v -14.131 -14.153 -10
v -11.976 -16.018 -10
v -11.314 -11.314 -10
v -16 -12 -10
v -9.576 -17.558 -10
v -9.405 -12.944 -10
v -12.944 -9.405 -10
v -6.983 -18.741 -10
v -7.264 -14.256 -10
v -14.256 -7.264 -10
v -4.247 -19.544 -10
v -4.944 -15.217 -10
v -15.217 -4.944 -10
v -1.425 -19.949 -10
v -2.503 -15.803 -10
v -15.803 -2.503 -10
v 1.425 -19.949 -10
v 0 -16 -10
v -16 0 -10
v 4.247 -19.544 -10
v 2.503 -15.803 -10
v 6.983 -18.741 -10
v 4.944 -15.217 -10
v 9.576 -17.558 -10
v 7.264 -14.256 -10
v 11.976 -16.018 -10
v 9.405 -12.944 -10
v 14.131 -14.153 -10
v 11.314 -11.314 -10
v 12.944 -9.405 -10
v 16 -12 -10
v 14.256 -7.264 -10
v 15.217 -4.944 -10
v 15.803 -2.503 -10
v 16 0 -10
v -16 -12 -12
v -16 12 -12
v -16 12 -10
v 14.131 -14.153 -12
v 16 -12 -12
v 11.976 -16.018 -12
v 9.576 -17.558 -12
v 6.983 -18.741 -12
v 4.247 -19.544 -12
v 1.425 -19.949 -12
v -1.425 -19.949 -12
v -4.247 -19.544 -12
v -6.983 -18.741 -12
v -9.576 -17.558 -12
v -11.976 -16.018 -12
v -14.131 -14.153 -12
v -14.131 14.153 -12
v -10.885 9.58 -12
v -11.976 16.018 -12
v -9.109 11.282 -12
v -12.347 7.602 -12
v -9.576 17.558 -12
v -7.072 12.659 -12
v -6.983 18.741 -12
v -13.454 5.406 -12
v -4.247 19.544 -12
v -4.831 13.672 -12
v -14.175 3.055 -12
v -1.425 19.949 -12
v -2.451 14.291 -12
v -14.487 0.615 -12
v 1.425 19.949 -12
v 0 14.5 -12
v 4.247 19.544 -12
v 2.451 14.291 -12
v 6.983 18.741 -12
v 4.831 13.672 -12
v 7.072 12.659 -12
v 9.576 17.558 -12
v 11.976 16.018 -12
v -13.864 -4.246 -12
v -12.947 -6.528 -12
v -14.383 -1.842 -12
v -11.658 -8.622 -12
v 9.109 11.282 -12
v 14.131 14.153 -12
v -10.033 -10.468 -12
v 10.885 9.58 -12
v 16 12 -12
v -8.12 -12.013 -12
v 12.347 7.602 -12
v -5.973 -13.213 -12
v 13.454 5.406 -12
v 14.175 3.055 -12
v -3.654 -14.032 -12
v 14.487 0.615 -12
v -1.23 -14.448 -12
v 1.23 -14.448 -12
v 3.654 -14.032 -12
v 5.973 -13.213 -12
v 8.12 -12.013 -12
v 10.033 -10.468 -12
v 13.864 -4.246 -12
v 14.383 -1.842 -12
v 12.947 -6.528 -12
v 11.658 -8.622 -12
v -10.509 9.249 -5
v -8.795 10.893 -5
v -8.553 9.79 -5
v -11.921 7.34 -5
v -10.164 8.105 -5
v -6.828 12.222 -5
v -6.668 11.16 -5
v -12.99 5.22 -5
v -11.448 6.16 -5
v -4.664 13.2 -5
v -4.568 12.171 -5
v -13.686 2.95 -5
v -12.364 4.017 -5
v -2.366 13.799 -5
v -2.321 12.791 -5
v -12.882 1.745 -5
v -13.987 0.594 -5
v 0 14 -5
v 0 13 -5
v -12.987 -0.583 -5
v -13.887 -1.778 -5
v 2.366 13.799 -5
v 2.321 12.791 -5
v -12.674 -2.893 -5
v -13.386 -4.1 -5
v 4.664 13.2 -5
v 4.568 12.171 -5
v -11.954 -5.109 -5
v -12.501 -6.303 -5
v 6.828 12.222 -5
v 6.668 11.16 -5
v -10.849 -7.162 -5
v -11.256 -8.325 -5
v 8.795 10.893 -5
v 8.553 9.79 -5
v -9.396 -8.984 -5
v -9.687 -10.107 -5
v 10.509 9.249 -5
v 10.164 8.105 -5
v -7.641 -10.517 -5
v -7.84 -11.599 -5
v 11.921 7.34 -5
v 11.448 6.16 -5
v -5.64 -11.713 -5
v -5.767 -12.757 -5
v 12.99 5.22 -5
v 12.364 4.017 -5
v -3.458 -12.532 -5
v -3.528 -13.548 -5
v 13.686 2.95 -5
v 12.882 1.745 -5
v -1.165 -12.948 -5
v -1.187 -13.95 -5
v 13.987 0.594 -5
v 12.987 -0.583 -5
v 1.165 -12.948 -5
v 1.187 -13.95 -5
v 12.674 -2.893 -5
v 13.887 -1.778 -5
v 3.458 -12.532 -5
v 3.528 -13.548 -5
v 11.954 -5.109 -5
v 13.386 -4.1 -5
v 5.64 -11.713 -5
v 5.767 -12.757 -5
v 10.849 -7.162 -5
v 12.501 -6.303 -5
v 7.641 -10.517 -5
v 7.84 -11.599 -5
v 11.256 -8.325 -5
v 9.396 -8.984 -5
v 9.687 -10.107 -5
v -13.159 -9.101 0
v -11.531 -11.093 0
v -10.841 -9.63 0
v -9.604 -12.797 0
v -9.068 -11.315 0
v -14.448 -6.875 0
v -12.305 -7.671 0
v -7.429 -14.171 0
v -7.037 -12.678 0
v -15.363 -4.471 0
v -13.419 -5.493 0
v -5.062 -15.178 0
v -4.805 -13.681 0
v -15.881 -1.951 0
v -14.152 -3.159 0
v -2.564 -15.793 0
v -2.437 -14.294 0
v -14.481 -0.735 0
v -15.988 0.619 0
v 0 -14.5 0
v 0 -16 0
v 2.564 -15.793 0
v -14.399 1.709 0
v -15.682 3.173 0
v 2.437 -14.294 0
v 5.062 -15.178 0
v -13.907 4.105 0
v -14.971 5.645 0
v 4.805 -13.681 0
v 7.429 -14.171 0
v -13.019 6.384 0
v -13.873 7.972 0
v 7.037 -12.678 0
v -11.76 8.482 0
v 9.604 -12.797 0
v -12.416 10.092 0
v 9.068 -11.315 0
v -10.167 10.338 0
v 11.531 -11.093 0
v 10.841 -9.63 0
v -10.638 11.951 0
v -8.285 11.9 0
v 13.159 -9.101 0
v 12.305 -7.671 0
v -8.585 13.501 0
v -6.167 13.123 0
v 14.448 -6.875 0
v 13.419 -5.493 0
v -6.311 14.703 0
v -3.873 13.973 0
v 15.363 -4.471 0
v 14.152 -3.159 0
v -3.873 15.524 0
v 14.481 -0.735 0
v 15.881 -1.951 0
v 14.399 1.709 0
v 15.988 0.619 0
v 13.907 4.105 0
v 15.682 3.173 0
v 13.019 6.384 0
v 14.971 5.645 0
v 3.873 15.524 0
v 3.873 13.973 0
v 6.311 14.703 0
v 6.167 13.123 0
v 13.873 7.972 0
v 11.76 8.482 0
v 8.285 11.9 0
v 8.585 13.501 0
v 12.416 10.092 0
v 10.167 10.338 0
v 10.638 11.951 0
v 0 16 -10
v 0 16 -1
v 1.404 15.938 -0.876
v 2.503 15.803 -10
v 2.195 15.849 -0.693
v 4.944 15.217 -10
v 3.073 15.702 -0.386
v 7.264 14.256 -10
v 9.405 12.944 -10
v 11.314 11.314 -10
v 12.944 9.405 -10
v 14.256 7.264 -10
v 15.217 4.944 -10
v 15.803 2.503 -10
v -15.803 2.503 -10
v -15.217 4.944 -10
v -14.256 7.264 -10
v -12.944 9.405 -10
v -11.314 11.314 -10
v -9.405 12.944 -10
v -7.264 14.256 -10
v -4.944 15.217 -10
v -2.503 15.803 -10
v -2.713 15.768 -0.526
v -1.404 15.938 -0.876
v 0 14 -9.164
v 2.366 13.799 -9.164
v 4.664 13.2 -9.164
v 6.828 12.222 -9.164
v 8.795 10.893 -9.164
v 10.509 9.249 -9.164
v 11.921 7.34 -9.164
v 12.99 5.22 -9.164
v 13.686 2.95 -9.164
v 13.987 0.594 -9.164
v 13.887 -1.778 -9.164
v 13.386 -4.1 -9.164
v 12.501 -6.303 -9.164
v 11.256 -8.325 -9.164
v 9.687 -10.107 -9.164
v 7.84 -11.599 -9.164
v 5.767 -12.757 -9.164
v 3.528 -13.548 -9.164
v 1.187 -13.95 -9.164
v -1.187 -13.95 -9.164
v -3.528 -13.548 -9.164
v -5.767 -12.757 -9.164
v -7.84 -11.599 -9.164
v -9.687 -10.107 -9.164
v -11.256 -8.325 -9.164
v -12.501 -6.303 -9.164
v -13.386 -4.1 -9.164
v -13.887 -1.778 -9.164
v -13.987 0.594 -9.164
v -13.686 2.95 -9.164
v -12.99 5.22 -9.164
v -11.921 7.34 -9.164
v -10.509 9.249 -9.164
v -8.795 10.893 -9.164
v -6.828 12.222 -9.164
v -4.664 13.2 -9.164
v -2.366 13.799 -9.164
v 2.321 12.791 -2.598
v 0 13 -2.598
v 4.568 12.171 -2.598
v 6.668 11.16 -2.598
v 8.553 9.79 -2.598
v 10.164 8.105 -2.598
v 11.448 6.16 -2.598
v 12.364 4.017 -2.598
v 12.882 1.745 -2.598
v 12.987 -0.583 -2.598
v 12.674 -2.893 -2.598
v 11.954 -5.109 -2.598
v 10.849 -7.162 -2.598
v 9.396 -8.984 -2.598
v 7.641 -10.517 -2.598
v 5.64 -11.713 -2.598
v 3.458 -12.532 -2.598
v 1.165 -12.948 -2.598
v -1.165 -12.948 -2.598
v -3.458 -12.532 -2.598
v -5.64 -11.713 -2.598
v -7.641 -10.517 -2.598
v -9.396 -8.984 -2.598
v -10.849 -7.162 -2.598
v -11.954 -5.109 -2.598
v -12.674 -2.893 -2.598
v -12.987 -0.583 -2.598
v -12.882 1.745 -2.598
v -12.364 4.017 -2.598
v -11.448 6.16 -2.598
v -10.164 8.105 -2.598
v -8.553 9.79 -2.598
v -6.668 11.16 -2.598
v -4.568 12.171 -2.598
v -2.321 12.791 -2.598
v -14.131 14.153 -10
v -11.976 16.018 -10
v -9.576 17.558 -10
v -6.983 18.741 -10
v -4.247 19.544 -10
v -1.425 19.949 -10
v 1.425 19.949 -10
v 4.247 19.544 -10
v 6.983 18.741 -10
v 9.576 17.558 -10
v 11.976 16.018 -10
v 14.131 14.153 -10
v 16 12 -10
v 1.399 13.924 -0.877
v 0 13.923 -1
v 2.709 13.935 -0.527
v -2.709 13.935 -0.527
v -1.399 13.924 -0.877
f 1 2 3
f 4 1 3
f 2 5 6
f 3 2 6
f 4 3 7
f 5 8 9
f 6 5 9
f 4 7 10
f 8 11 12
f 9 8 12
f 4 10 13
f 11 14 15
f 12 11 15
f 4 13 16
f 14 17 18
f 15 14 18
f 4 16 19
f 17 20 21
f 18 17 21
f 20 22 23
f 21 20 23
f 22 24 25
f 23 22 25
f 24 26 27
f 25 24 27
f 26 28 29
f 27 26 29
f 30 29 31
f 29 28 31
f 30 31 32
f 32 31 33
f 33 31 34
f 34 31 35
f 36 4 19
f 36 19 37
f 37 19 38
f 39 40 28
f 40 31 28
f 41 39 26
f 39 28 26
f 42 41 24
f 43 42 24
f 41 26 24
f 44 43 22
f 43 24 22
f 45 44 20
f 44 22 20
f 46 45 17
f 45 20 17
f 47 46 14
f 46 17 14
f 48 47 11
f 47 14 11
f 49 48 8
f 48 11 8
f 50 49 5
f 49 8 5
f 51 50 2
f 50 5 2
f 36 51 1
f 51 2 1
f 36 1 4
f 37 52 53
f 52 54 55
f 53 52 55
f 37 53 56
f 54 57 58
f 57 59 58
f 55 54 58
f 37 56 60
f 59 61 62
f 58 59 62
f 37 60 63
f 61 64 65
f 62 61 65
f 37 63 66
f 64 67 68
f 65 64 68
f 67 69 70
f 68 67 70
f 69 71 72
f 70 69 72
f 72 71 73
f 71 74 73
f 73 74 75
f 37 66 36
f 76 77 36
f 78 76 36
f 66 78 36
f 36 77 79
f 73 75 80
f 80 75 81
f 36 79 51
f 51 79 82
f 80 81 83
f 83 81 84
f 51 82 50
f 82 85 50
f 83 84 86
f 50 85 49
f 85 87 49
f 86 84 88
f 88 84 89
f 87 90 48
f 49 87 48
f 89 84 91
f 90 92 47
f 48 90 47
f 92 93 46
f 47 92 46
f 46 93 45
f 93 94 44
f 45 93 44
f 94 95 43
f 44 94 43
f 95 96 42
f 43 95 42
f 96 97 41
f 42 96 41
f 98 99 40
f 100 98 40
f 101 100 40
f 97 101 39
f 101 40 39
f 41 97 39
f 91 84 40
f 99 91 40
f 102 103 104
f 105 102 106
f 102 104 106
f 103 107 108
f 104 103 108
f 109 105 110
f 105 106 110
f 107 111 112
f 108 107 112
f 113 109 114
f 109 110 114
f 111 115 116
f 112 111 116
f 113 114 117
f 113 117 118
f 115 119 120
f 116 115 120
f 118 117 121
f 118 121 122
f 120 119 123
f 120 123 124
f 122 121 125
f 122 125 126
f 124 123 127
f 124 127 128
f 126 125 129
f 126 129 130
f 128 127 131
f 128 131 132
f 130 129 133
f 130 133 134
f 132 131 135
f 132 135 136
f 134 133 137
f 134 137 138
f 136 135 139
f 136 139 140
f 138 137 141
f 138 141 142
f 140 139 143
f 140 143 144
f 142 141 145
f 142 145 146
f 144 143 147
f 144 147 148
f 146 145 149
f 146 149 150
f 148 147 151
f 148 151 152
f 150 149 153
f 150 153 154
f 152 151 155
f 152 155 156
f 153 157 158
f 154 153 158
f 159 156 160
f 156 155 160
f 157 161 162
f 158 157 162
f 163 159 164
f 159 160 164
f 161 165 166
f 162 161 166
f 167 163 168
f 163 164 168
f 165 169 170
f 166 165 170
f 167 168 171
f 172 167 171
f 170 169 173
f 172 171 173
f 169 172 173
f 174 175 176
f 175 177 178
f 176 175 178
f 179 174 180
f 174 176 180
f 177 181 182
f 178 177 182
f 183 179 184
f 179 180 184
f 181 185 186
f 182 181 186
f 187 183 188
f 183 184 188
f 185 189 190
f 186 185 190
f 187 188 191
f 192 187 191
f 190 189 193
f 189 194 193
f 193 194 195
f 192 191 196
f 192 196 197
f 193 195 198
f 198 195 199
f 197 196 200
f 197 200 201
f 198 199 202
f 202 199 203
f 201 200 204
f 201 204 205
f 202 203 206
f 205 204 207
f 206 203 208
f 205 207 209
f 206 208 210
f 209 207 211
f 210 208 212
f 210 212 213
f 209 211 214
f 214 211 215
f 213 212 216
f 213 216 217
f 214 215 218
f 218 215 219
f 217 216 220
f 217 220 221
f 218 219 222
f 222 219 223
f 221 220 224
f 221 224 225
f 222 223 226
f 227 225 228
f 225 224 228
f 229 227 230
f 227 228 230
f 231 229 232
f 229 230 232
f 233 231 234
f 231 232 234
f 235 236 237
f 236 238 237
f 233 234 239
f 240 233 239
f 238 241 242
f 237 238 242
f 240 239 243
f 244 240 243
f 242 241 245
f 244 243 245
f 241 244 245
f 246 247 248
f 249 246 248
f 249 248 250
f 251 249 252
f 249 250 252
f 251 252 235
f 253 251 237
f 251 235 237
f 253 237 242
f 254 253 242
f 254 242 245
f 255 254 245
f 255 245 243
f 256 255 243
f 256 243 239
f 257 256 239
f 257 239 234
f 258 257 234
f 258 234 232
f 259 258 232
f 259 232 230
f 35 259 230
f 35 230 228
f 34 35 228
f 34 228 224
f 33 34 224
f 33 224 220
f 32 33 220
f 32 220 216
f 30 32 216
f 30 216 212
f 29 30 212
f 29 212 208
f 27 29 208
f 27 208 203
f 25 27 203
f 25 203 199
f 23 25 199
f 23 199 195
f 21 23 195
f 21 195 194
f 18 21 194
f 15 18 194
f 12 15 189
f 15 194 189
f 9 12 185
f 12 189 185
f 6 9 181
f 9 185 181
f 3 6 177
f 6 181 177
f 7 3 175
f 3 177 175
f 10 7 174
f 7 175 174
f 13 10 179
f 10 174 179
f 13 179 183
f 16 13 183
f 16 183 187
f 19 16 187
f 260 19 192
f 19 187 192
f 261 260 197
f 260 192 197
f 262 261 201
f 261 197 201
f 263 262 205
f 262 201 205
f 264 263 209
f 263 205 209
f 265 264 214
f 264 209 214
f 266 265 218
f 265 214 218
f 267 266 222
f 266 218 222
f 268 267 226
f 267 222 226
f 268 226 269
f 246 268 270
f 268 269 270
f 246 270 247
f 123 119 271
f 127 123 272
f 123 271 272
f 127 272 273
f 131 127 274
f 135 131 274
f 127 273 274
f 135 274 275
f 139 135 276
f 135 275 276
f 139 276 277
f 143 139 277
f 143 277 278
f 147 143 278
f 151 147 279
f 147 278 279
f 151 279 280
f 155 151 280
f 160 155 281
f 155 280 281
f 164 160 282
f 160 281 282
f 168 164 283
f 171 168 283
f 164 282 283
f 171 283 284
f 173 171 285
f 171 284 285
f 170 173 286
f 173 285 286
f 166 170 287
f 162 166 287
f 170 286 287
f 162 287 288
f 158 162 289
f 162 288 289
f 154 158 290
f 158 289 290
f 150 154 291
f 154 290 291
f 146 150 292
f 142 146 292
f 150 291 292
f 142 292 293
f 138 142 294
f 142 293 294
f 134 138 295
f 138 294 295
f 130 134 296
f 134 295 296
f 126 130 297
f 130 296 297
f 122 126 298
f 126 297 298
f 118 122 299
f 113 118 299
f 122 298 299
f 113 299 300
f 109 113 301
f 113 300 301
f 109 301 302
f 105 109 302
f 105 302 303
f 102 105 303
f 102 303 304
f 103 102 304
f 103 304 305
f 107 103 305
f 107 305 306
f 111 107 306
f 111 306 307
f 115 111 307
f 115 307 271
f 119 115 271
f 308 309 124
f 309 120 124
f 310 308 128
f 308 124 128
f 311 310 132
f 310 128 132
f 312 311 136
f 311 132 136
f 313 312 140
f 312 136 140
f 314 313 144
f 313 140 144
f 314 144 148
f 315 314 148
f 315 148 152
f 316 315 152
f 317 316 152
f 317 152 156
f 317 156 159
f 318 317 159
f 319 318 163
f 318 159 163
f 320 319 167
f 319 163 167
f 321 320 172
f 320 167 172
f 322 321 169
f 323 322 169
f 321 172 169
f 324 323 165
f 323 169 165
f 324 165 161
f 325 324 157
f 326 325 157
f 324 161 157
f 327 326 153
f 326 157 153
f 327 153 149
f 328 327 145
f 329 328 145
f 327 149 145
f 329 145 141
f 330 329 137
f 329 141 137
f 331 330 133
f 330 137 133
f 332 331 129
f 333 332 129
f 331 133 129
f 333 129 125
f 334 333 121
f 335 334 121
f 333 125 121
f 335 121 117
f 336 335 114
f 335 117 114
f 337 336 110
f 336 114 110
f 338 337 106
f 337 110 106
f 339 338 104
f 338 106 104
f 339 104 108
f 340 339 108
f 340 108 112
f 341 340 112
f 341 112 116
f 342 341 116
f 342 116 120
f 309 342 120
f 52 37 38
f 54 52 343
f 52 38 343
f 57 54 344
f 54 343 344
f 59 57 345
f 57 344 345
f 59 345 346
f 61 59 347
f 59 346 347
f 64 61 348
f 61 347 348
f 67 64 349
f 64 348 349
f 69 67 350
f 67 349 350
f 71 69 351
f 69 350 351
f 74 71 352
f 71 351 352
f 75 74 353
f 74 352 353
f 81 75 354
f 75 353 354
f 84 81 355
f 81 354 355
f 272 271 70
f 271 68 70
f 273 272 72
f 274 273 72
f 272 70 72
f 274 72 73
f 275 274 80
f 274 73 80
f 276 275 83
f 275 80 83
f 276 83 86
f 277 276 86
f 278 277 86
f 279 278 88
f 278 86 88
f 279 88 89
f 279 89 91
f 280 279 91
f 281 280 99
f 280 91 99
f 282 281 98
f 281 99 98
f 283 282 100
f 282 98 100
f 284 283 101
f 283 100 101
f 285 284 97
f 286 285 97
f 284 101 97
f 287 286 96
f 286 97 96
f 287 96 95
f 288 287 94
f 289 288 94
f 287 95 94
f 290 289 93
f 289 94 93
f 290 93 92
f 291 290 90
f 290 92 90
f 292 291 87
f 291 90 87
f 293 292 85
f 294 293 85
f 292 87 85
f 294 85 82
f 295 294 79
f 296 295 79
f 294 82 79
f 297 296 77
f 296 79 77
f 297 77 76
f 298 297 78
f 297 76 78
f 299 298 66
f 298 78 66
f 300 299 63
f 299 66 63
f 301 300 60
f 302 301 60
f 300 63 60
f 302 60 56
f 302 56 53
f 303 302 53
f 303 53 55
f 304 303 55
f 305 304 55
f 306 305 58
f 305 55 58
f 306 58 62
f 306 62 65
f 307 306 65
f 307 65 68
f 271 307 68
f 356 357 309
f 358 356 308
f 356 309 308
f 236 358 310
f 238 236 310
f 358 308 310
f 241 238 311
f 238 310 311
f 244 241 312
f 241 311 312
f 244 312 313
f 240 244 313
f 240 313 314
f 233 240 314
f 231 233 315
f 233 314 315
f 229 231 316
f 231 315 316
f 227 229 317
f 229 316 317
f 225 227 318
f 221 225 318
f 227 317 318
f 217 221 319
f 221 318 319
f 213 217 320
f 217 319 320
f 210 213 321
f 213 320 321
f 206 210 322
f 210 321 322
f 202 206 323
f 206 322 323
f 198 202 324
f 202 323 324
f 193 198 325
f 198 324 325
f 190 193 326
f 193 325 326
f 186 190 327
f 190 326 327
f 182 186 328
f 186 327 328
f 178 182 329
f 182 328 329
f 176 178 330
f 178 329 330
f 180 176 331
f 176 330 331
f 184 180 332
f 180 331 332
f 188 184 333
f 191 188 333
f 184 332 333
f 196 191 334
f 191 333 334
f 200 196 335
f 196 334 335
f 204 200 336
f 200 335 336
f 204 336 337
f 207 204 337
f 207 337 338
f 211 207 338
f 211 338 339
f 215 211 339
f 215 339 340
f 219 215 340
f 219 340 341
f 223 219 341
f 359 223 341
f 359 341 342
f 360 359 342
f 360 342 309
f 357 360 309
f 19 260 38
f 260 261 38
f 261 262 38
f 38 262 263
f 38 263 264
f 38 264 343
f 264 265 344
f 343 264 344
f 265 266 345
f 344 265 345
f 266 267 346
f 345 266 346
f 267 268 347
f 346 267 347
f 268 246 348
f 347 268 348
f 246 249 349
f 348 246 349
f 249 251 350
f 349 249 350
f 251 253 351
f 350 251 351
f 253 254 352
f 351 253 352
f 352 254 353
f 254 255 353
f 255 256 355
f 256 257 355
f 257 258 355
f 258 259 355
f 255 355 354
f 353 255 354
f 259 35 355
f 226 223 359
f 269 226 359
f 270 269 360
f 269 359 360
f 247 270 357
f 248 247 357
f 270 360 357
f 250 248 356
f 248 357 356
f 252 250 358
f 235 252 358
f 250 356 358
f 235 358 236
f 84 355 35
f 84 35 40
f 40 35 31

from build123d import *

# Parameters (mm, degrees)
CUT_EXTRUDE_1_DEPTH      = 11
CUT_EXTRUDE_1_DEPTH_BACK = 3
CUT_EXTRUDE_2_DEPTH      = 21


with BuildPart() as part:
    # Эскиз1 → Повернуть1 (revolve)
    with BuildSketch(Plane(origin=(0, 0, 0), x_dir=(0, 0, -1), z_dir=(1, 0, 0))):
        Polygon((2.598076211, 13), (5, 13), (5, 14), (9.16435909, 14), (12, 14.5), (12, 20), (10, 20), (10, 16), (0, 16), (0, 14.5), align=None)
    revolve(axis=Axis((0, 0, 0), (0, 0, -1)))

    # Эскиз2 → Вырез-Вытянуть1 (cut, two sides)
    with BuildSketch(Plane.XY.offset(-10)) as cut_extrude_1_sk:
        with BuildLine():
            Line((-16, -12), (-16, 12))
            ThreePointArc((-16, 12), (-20, 0), (-16, -12))
        make_face()
        with BuildLine():
            ThreePointArc((20, 0), (18.973665961, 6.32455532), (16, 12))
            Line((16, 12), (16, -12))
            ThreePointArc((16, -12), (18.973665961, -6.32455532), (20, 0))
        make_face()
    extrude(amount=CUT_EXTRUDE_1_DEPTH, mode=Mode.SUBTRACT)
    extrude(cut_extrude_1_sk.sketch, amount=-CUT_EXTRUDE_1_DEPTH_BACK, mode=Mode.SUBTRACT)

    # Эскиз3 → Вырез-Вытянуть2 (cut, through all)
    with BuildSketch(Plane(origin=(0, 0, 0), x_dir=(1, 0, 0), z_dir=(0, 1, 0))):
        with BuildLine():
            Line((-53.249204779, -27.319040473), (-3.872983346, 0))
            ThreePointArc((-3.872983346, 0), (0, 1), (3.872983346, 0))
            Line((3.872983346, 0), (53.249204779, -27.319040473))
            Line((53.249204779, -27.319040473), (53.249204779, -140.178975177))
            Line((53.249204779, -140.178975177), (-53.249204779, -140.178975177))
            Line((-53.249204779, -140.178975177), (-53.249204779, -27.319040473))
        make_face()
    extrude(amount=CUT_EXTRUDE_2_DEPTH, mode=Mode.SUBTRACT)


solid = part.part
